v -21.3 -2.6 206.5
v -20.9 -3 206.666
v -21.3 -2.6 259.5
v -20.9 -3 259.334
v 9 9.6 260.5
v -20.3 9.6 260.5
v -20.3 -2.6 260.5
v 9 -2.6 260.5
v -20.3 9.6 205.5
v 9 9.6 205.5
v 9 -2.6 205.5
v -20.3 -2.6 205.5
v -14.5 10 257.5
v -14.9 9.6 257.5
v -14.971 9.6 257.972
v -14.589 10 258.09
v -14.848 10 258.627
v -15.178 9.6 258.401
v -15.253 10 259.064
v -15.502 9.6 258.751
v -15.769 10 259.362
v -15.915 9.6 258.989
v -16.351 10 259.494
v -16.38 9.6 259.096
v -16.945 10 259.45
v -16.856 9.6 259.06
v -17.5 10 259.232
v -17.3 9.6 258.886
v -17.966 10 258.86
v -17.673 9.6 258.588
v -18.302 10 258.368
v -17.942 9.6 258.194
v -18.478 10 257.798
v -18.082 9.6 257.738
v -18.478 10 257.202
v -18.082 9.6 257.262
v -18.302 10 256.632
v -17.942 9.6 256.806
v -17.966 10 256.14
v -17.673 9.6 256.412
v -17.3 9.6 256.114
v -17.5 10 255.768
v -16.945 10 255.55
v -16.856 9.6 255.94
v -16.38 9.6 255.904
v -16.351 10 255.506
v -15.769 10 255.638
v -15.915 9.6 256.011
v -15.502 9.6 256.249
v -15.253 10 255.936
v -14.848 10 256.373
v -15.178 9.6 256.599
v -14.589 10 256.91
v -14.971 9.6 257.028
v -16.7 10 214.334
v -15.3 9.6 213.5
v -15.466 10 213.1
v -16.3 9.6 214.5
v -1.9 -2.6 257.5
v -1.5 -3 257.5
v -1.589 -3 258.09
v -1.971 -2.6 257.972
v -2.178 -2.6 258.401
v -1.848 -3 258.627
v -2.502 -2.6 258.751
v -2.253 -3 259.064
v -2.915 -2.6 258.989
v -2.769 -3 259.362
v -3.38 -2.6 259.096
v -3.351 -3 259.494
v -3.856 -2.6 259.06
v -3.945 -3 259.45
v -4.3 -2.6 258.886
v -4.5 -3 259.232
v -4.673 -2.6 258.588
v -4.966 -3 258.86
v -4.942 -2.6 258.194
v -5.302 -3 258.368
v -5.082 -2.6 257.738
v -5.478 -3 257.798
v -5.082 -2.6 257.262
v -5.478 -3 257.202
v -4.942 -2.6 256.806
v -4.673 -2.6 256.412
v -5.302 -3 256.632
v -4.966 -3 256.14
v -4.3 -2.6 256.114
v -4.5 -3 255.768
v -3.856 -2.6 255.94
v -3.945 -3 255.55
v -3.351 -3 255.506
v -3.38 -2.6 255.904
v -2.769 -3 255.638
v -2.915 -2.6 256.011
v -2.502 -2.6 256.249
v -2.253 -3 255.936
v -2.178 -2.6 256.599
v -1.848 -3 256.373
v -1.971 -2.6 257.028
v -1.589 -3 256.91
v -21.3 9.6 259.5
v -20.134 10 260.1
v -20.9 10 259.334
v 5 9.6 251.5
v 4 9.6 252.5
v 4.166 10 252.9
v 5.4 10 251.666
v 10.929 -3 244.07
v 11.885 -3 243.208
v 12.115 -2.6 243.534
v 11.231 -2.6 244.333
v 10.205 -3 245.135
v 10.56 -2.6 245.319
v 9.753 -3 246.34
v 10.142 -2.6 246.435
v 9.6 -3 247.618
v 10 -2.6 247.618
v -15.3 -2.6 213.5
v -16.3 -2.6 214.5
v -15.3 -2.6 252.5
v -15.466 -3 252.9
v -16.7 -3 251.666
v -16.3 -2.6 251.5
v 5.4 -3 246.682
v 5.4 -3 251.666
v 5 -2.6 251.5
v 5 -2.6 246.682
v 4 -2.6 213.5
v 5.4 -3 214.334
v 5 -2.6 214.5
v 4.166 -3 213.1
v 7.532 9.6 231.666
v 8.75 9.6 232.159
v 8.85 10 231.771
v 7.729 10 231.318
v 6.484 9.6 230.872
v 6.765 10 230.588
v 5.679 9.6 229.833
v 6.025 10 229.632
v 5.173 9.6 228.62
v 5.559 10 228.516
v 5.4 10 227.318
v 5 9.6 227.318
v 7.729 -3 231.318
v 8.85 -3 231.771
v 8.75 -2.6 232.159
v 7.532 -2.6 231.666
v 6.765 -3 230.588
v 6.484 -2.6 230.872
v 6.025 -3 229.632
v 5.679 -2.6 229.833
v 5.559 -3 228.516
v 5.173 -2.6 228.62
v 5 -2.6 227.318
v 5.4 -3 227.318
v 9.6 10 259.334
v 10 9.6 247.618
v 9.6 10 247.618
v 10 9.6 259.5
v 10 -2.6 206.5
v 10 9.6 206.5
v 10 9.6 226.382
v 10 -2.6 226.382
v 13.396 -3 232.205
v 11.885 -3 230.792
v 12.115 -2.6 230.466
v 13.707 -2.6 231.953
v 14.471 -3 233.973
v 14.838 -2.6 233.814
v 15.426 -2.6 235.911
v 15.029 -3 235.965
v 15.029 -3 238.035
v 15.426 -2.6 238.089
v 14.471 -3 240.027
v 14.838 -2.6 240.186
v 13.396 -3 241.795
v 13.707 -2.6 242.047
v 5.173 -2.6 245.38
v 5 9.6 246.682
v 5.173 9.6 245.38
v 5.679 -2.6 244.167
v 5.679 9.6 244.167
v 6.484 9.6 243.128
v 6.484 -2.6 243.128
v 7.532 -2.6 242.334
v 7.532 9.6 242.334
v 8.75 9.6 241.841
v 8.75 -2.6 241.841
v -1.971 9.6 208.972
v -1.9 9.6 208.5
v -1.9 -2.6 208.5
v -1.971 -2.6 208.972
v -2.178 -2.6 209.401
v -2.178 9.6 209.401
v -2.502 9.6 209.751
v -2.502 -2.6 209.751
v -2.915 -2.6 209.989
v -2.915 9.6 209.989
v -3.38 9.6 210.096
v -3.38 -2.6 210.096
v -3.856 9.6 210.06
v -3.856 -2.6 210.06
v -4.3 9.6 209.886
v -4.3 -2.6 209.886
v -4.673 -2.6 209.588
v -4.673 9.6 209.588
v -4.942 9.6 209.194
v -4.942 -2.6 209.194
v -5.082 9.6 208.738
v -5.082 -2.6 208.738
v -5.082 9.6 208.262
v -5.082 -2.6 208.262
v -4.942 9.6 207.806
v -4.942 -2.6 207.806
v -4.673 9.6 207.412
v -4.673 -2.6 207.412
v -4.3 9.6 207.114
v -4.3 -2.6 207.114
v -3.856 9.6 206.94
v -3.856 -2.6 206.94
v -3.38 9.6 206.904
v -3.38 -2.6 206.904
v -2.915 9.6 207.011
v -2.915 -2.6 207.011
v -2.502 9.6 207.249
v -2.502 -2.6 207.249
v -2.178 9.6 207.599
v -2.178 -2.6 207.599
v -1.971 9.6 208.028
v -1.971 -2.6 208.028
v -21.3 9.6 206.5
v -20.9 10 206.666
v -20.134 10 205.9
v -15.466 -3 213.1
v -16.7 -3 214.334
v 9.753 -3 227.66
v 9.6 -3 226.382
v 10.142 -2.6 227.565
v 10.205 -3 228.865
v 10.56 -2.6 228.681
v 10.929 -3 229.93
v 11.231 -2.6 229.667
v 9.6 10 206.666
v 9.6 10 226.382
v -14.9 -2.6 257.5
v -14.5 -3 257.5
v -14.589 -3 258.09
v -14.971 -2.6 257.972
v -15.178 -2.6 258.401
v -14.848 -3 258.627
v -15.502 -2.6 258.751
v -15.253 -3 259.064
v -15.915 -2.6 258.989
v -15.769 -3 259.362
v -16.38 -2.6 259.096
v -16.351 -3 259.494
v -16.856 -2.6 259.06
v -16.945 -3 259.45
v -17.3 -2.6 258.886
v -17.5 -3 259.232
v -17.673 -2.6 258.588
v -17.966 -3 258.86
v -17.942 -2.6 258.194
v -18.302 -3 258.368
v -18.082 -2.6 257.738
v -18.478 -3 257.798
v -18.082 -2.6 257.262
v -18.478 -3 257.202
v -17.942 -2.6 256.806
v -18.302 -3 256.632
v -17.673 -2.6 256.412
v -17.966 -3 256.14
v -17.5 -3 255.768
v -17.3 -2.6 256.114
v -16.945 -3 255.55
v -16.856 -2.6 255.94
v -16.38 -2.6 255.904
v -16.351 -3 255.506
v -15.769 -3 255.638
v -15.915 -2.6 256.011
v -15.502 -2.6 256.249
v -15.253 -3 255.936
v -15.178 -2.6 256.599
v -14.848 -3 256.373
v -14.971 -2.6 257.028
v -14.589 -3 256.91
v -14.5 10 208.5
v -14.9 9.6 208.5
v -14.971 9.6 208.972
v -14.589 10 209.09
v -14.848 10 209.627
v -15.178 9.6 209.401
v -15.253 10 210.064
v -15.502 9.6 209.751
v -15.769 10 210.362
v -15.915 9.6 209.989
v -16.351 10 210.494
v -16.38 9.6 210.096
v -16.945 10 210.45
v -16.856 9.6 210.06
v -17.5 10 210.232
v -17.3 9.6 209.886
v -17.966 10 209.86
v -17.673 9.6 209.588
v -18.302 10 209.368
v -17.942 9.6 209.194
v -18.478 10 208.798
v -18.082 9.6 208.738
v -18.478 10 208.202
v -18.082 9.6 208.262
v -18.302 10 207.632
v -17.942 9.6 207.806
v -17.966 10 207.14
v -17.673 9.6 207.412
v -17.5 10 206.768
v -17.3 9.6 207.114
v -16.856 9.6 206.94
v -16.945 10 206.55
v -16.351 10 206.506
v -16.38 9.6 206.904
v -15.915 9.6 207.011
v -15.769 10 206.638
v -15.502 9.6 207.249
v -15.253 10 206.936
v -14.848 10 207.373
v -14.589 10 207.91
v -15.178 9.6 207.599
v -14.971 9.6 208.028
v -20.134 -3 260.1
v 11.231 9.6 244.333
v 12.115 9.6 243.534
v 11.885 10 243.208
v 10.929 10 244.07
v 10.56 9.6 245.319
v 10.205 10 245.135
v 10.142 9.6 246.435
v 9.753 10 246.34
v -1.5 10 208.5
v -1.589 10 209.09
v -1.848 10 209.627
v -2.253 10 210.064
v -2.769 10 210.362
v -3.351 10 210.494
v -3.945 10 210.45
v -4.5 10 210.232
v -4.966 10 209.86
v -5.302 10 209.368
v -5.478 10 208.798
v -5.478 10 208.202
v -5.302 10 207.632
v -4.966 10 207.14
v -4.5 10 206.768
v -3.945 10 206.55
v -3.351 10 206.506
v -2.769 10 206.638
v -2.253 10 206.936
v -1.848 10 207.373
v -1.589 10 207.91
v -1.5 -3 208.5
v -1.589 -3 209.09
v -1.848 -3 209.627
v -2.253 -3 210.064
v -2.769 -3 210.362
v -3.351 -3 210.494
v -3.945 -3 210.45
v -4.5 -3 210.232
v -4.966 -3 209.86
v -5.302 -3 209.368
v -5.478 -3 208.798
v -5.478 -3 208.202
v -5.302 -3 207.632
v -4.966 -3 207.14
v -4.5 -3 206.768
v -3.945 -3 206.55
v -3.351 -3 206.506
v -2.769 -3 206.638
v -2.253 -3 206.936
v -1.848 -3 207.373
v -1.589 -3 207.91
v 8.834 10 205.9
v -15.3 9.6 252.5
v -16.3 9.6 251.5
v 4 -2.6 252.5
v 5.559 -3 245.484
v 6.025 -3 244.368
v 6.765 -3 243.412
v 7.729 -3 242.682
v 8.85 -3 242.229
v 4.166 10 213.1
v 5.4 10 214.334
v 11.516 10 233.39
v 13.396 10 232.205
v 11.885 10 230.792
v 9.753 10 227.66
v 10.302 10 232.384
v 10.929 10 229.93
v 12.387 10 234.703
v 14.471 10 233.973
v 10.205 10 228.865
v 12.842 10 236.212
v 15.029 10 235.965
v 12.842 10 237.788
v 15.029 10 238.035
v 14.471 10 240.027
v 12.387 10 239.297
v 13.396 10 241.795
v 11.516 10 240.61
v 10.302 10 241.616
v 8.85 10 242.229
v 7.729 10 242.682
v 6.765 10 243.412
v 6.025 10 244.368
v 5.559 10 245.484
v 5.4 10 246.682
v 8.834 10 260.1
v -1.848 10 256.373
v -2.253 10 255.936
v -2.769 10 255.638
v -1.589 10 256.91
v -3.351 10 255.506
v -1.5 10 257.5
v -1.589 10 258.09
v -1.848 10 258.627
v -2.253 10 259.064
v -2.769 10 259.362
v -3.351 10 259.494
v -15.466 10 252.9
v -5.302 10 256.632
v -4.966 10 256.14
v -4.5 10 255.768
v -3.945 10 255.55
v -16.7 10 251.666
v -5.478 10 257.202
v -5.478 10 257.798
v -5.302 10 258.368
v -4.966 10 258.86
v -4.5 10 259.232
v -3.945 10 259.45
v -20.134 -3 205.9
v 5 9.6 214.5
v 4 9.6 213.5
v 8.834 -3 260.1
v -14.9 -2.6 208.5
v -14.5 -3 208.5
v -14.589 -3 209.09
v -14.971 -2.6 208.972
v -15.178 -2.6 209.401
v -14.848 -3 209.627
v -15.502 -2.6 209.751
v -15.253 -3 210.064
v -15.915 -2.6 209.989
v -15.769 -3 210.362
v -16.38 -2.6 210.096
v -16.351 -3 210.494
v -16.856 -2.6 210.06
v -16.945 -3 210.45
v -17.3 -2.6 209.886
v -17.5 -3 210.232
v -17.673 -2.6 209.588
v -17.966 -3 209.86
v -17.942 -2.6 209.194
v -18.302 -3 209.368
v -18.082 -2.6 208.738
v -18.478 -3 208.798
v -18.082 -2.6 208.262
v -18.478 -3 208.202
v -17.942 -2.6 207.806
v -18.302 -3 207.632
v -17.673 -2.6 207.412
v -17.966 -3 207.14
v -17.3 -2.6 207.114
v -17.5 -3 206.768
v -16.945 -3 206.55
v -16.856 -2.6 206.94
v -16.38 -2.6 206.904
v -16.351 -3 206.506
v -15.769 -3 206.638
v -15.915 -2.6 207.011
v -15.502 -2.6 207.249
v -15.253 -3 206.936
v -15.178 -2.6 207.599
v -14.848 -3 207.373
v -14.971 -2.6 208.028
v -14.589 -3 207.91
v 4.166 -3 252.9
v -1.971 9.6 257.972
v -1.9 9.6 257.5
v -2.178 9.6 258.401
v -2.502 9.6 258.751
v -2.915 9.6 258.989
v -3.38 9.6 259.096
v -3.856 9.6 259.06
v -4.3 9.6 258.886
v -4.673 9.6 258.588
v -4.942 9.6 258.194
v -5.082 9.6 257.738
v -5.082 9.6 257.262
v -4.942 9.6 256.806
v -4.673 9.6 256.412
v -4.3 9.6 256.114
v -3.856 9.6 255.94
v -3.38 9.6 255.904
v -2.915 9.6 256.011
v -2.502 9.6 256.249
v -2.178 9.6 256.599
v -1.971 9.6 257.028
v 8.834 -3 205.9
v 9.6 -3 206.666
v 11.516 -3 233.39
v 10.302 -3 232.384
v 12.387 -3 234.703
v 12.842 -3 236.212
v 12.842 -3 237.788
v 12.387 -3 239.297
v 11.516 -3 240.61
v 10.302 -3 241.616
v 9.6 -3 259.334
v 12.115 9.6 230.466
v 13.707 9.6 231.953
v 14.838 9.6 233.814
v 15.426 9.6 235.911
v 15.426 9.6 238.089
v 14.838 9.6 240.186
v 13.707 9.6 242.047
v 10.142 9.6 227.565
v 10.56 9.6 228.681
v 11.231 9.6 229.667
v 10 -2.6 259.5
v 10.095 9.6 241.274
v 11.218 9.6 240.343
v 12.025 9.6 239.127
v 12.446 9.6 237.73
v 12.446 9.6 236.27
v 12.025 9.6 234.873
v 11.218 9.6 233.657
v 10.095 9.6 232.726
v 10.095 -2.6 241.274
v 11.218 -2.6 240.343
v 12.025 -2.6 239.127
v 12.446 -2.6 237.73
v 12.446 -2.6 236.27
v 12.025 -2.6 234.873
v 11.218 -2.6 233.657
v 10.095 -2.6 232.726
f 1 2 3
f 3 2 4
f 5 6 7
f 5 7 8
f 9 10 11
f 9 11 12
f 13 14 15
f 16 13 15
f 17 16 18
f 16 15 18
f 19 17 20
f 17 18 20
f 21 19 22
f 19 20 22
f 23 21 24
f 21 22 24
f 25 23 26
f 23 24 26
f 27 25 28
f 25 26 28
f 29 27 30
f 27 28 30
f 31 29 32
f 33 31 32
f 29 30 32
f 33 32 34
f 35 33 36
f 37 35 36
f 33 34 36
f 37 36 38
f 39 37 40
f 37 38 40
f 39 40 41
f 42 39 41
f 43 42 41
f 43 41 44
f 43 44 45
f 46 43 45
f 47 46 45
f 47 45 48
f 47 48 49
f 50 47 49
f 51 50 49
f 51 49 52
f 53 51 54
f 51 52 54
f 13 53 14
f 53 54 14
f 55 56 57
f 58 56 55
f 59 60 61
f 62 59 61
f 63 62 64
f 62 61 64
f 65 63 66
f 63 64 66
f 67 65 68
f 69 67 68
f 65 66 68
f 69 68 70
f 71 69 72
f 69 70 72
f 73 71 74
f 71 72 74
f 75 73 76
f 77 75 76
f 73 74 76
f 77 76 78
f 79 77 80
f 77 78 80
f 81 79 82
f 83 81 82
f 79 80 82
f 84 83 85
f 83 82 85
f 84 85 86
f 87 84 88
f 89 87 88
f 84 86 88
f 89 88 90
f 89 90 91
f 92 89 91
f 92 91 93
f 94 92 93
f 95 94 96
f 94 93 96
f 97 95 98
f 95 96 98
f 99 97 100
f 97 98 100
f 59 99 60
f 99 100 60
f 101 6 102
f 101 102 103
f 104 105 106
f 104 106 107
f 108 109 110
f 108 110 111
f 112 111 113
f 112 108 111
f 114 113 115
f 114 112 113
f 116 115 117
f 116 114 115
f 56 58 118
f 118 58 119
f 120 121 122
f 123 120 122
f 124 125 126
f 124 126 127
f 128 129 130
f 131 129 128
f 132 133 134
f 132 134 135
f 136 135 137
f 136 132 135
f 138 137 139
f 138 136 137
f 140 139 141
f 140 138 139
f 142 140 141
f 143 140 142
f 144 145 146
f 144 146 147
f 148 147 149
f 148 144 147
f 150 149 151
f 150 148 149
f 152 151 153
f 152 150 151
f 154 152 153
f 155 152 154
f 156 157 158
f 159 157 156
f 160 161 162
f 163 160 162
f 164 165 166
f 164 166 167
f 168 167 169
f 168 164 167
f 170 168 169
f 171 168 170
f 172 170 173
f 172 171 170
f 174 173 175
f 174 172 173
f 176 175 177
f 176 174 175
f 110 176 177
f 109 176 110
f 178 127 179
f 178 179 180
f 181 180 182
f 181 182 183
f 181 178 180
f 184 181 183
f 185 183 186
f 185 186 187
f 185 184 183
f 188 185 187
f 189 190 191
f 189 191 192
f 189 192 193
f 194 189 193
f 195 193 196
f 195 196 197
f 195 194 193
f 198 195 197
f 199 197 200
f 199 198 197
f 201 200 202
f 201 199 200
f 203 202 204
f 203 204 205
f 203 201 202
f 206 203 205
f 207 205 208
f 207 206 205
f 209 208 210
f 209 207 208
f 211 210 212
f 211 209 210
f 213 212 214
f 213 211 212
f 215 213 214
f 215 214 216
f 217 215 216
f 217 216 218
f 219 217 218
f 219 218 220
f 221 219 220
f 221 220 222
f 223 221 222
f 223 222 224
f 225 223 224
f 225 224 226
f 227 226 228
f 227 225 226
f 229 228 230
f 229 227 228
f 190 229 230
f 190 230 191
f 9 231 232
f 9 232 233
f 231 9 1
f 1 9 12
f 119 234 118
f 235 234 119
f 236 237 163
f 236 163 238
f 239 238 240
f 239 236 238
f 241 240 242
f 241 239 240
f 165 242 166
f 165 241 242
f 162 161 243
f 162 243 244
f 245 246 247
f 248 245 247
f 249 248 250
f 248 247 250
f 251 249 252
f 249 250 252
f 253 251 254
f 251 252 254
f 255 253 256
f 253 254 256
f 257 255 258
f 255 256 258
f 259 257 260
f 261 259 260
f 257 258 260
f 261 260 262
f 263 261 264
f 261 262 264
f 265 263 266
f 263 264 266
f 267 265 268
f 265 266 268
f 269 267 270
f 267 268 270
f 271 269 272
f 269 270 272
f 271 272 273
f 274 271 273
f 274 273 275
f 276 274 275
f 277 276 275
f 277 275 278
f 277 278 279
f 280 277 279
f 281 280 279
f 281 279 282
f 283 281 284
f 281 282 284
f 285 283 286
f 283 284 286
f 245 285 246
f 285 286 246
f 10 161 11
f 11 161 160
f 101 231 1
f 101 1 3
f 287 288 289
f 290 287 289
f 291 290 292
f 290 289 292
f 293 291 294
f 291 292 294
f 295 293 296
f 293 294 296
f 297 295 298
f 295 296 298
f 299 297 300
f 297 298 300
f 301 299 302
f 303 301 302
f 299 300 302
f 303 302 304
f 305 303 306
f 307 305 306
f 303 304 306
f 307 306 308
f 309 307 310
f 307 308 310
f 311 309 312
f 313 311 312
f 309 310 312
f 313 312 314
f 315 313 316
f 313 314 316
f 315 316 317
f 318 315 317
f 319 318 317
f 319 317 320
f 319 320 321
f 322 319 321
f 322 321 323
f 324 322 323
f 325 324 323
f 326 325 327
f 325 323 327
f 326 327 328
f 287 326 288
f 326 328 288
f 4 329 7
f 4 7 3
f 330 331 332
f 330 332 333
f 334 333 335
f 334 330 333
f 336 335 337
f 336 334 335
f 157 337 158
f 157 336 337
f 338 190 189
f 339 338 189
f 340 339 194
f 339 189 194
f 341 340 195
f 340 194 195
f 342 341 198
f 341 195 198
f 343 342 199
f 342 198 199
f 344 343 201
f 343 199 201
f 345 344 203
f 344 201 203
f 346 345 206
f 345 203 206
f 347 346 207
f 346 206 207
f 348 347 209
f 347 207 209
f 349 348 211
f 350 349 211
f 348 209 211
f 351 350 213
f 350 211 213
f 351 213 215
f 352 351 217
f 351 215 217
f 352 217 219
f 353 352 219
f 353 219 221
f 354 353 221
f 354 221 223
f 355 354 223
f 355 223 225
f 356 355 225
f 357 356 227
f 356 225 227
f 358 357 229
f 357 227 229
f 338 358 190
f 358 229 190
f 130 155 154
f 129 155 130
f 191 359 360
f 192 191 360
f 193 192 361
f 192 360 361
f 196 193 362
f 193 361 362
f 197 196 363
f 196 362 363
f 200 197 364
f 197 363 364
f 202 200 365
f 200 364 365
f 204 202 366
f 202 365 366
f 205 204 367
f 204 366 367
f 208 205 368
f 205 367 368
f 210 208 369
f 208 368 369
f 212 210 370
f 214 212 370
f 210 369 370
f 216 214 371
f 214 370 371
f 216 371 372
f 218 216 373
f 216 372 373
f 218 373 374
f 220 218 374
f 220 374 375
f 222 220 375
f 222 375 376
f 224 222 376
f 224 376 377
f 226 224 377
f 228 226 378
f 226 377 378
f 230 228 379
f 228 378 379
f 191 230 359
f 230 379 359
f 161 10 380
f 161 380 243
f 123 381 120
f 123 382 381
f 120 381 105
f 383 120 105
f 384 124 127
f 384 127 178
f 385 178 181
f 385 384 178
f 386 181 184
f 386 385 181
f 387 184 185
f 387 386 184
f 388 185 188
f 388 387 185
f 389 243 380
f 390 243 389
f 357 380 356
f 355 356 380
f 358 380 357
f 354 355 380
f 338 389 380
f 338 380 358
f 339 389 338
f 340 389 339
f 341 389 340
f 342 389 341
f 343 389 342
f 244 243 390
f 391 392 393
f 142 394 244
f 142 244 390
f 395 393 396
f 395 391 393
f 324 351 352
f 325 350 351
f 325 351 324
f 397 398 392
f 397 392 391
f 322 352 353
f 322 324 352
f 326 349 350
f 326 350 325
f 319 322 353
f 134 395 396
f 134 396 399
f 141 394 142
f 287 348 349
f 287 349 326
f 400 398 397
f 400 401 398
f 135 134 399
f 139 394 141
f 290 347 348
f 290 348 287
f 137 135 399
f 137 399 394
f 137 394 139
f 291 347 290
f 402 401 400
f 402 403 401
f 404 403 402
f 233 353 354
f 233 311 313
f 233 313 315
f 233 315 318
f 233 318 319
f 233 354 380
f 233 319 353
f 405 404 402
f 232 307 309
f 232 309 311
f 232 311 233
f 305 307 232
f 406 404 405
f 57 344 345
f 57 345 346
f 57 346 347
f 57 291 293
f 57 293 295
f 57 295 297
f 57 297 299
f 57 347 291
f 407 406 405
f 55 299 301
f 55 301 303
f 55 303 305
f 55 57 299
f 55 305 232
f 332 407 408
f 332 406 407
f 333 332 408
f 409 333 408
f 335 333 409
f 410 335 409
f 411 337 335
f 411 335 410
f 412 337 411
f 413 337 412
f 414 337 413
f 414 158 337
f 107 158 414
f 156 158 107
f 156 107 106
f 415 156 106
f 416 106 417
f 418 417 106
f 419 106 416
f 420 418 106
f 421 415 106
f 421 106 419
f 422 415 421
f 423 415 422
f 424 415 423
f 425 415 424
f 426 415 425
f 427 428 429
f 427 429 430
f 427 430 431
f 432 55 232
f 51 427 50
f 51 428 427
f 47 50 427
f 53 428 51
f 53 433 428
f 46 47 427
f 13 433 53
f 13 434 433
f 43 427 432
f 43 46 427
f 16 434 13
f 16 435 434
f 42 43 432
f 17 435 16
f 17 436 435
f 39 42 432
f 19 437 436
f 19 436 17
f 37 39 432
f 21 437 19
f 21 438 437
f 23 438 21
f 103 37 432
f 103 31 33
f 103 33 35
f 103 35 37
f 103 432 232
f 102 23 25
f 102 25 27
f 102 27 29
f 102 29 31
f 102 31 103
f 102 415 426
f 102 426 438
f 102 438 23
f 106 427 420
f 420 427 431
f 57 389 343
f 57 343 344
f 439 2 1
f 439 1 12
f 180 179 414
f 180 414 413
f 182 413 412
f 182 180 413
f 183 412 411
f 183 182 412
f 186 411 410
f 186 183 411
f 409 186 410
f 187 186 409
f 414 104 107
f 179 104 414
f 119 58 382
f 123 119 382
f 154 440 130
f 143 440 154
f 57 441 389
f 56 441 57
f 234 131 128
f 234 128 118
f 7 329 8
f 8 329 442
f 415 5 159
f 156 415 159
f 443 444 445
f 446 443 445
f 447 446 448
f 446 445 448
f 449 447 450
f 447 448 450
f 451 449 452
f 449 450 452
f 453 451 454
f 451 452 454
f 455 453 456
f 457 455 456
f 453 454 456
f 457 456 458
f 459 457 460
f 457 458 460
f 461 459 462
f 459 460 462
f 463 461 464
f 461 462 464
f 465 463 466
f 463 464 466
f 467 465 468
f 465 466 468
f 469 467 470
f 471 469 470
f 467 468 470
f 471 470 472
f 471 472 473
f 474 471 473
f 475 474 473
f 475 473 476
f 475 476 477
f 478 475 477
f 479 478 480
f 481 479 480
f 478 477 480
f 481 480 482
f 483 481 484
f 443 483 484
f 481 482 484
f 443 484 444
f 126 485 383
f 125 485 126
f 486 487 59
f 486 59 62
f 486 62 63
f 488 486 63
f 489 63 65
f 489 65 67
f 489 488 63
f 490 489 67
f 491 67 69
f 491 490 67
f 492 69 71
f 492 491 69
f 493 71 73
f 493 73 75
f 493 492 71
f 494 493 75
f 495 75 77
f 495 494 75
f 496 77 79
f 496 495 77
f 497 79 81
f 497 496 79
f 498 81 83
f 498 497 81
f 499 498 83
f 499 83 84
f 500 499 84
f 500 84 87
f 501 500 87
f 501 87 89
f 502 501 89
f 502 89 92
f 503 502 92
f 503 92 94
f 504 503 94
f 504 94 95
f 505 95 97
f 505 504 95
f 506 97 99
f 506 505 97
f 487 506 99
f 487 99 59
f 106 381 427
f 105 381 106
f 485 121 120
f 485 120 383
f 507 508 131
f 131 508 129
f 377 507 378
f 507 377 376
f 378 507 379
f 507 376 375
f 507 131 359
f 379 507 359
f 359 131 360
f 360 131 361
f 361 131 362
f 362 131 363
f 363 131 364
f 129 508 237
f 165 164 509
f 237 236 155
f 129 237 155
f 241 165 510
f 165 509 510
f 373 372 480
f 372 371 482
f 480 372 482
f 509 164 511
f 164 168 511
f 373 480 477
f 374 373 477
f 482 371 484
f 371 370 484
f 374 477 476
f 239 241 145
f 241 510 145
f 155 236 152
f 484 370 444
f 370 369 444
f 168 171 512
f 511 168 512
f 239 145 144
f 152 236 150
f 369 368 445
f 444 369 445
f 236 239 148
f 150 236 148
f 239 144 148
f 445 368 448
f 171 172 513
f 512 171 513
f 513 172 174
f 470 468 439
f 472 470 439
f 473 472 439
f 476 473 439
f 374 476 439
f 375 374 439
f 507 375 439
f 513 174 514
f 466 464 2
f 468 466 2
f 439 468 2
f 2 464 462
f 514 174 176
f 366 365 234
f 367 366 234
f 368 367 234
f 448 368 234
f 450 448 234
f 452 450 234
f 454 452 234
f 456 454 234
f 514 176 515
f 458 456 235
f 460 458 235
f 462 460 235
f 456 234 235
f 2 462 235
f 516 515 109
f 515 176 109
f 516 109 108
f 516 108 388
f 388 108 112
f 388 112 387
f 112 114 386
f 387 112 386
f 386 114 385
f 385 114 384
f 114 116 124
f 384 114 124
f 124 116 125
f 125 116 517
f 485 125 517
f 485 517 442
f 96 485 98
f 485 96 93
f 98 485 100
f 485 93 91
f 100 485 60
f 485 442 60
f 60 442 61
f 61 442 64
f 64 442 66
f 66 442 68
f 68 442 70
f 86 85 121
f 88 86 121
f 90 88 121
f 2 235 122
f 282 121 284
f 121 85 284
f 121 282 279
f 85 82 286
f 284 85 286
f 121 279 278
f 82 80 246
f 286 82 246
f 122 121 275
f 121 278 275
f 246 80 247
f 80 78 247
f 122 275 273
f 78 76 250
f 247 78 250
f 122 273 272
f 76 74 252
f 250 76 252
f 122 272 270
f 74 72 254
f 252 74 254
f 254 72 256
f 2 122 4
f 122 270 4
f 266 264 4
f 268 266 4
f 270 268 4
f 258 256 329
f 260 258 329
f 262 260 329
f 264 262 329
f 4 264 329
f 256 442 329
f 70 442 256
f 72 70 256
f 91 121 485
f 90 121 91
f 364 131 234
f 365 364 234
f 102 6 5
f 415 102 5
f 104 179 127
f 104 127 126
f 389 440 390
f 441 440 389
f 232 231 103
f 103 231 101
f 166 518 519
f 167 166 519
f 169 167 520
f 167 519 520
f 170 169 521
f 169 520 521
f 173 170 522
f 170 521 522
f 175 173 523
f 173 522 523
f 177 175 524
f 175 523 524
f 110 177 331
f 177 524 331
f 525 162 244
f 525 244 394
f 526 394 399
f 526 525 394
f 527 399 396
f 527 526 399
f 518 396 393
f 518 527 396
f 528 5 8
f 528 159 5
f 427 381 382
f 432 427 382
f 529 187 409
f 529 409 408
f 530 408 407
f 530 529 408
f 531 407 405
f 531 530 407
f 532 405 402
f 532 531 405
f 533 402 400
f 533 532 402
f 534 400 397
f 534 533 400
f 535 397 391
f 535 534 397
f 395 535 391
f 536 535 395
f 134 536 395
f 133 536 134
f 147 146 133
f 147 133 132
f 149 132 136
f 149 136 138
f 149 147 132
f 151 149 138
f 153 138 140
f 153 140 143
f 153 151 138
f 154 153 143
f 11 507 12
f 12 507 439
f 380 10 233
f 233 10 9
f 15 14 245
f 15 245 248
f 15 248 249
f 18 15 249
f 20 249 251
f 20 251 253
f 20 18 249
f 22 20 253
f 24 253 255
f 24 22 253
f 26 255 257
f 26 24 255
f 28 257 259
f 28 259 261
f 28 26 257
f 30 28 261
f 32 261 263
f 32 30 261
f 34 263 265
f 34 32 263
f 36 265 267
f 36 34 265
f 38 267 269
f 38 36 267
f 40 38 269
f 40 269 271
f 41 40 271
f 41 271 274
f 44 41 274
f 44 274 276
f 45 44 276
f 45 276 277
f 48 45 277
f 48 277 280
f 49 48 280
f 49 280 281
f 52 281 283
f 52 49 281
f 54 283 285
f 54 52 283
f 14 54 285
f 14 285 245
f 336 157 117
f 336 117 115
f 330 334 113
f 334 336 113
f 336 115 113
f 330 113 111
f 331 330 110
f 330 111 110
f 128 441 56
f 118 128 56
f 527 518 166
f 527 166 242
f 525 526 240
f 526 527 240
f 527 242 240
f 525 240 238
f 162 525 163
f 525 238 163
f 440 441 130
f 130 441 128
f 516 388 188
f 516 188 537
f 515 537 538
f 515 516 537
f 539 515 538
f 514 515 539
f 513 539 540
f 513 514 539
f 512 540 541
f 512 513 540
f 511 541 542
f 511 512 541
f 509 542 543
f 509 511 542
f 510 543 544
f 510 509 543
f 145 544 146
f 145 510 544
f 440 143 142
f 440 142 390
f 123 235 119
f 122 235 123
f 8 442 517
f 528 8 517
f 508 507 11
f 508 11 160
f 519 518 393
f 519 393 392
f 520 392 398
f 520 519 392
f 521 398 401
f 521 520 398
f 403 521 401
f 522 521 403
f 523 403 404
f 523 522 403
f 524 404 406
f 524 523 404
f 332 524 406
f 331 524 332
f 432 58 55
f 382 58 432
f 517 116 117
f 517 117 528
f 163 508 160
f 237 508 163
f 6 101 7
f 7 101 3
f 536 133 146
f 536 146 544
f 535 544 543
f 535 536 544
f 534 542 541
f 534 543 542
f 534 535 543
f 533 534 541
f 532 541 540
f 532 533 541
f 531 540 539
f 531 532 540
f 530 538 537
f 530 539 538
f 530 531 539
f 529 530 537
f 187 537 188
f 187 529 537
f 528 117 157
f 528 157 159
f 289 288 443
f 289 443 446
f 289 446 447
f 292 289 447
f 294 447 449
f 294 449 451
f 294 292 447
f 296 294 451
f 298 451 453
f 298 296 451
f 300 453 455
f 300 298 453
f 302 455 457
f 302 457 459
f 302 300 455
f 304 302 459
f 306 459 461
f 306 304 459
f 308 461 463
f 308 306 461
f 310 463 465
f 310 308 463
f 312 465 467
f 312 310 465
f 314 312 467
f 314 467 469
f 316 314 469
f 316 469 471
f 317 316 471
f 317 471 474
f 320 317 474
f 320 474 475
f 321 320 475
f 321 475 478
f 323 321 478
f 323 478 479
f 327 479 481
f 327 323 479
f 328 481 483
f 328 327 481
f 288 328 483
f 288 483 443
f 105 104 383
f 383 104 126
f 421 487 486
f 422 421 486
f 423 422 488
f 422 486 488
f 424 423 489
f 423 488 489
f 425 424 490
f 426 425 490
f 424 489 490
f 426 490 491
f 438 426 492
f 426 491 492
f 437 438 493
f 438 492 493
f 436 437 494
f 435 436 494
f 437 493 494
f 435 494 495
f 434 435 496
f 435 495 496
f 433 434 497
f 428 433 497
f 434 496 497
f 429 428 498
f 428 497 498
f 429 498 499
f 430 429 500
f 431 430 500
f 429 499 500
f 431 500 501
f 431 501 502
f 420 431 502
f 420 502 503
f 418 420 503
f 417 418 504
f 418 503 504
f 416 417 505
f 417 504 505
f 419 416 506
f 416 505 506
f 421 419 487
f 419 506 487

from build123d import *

# Parameters (mm, degrees)
SKETCH151_R     = 1.6
PAD085_DEPTH    = 13
CHAMFER055_SIZE = 1
FILLET050_R     = 5
CHAMFER061_SIZE = 0.4


with BuildPart() as part:
    # Sketch151 → Pad085 (new body)
    with BuildSketch(Plane.XZ):
        with BuildLine():
            Line((-11.3, 27.5), (20, 27.5))
            Line((20, 11.599342), (20, 27.5))
            ThreePointArc((20, -3.599342), (25.5, 4), (20, 11.599342))
            Line((20, -27.5), (20, -3.599342))
            Line((20, -27.5), (-11.3, -27.5))
            Line((-11.3, -27.5), (-11.3, 27.5))
        make_face()
        with Locations((-6.5, 24.5)):
            Circle(SKETCH151_R, mode=Mode.SUBTRACT)
        with Locations((6.5, 24.5)):
            Circle(SKETCH151_R, mode=Mode.SUBTRACT)
        with Locations((-6.5, -24.5)):
            Circle(SKETCH151_R, mode=Mode.SUBTRACT)
        with Locations((6.5, -24.5)):
            Circle(SKETCH151_R, mode=Mode.SUBTRACT)
        with BuildLine():
            Line((-6.3, 19.5), (15, 19.5))
            Line((15, 8.330127), (15, 19.5))
            ThreePointArc((15, -0.330127), (22.5, 4), (15, 8.330127))
            Line((15, -19.5), (15, -0.330127))
            Line((15, -19.5), (-6.3, -19.5))
            Line((-6.3, -19.5), (-6.3, 19.5))
        make_face(mode=Mode.SUBTRACT)
    extrude(amount=PAD085_DEPTH)

    # Chamfer055
    chamfer055_edges = [part.edges().sort_by_distance(p)[0] for p in [
        (-11.3, -6.5, -27.5),
        (20, -6.5, -27.5),
        (-11.3, -6.5, 27.5),
        (20, -6.5, 27.5),
        (-6.3, -6.5, 19.5),
        (-6.3, -6.5, -19.5),
        (15, -6.5, -19.5),
        (15, -6.5, 19.5),
    ]]
    chamfer(chamfer055_edges, length=CHAMFER055_SIZE)

    # Fillet050
    fillet050_edges = [part.edges().sort_by_distance(p)[0] for p in [
        (15, -6.5, 8.330127),
        (15, -6.5, -0.330127),
        (20, -6.5, -3.599342),
        (20, -6.5, 11.599342),
    ]]
    fillet(fillet050_edges, radius=FILLET050_R)

    # Chamfer061
    chamfer061_edges = [part.edges().sort_by_distance(p)[0] for p in [
        (16.047153, -13, 10.620596),
        (16.047153, 0, 10.620596),
        (14.5, -13, 19),
        (4.35, -13, 19.5),
        (-5.8, -13, 19),
        (-6.3, -13, 0),
        (-5.8, -13, -19),
        (4.35, -13, -19.5),
        (14.5, -13, -19),
        (14.5, 0, -19),
        (4.35, 0, -19.5),
        (-5.8, 0, -19),
        (-6.3, 0, 0),
        (-5.8, 0, 19),
        (4.35, 0, 19.5),
        (14.5, 0, 19),
        (-11.3, -13, 0),
        (-10.8, -13, 27),
        (4.35, -13, 27.5),
        (19.5, -13, 27),
        (20, -13, 20.55919),
        (19.5, -13, -27),
        (4.35, -13, -27.5),
        (-10.8, -13, -27),
        (-11.3, 0, 0),
        (-10.8, 0, 27),
        (4.35, 0, 27.5),
        (20, 0, 20.55919),
        (19.5, 0, 27),
        (19.5, 0, -27),
        (-10.8, 0, -27),
        (4.35, 0, -27.5),
        (-8.1, 0, 24.5),
        (4.9, 0, 24.5),
        (4.9, -13, 24.5),
        (-8.1, -13, 24.5),
        (4.9, 0, -24.5),
        (-8.1, 0, -24.5),
        (-8.1, -13, -24.5),
        (4.9, -13, -24.5),
    ]]
    chamfer(chamfer061_edges, length=CHAMFER061_SIZE)


with BuildPart() as part_1:
    # Body073 placement: moved
    add(part.part.moved(Location((-10, 10, 233))))


solid = part_1.part
